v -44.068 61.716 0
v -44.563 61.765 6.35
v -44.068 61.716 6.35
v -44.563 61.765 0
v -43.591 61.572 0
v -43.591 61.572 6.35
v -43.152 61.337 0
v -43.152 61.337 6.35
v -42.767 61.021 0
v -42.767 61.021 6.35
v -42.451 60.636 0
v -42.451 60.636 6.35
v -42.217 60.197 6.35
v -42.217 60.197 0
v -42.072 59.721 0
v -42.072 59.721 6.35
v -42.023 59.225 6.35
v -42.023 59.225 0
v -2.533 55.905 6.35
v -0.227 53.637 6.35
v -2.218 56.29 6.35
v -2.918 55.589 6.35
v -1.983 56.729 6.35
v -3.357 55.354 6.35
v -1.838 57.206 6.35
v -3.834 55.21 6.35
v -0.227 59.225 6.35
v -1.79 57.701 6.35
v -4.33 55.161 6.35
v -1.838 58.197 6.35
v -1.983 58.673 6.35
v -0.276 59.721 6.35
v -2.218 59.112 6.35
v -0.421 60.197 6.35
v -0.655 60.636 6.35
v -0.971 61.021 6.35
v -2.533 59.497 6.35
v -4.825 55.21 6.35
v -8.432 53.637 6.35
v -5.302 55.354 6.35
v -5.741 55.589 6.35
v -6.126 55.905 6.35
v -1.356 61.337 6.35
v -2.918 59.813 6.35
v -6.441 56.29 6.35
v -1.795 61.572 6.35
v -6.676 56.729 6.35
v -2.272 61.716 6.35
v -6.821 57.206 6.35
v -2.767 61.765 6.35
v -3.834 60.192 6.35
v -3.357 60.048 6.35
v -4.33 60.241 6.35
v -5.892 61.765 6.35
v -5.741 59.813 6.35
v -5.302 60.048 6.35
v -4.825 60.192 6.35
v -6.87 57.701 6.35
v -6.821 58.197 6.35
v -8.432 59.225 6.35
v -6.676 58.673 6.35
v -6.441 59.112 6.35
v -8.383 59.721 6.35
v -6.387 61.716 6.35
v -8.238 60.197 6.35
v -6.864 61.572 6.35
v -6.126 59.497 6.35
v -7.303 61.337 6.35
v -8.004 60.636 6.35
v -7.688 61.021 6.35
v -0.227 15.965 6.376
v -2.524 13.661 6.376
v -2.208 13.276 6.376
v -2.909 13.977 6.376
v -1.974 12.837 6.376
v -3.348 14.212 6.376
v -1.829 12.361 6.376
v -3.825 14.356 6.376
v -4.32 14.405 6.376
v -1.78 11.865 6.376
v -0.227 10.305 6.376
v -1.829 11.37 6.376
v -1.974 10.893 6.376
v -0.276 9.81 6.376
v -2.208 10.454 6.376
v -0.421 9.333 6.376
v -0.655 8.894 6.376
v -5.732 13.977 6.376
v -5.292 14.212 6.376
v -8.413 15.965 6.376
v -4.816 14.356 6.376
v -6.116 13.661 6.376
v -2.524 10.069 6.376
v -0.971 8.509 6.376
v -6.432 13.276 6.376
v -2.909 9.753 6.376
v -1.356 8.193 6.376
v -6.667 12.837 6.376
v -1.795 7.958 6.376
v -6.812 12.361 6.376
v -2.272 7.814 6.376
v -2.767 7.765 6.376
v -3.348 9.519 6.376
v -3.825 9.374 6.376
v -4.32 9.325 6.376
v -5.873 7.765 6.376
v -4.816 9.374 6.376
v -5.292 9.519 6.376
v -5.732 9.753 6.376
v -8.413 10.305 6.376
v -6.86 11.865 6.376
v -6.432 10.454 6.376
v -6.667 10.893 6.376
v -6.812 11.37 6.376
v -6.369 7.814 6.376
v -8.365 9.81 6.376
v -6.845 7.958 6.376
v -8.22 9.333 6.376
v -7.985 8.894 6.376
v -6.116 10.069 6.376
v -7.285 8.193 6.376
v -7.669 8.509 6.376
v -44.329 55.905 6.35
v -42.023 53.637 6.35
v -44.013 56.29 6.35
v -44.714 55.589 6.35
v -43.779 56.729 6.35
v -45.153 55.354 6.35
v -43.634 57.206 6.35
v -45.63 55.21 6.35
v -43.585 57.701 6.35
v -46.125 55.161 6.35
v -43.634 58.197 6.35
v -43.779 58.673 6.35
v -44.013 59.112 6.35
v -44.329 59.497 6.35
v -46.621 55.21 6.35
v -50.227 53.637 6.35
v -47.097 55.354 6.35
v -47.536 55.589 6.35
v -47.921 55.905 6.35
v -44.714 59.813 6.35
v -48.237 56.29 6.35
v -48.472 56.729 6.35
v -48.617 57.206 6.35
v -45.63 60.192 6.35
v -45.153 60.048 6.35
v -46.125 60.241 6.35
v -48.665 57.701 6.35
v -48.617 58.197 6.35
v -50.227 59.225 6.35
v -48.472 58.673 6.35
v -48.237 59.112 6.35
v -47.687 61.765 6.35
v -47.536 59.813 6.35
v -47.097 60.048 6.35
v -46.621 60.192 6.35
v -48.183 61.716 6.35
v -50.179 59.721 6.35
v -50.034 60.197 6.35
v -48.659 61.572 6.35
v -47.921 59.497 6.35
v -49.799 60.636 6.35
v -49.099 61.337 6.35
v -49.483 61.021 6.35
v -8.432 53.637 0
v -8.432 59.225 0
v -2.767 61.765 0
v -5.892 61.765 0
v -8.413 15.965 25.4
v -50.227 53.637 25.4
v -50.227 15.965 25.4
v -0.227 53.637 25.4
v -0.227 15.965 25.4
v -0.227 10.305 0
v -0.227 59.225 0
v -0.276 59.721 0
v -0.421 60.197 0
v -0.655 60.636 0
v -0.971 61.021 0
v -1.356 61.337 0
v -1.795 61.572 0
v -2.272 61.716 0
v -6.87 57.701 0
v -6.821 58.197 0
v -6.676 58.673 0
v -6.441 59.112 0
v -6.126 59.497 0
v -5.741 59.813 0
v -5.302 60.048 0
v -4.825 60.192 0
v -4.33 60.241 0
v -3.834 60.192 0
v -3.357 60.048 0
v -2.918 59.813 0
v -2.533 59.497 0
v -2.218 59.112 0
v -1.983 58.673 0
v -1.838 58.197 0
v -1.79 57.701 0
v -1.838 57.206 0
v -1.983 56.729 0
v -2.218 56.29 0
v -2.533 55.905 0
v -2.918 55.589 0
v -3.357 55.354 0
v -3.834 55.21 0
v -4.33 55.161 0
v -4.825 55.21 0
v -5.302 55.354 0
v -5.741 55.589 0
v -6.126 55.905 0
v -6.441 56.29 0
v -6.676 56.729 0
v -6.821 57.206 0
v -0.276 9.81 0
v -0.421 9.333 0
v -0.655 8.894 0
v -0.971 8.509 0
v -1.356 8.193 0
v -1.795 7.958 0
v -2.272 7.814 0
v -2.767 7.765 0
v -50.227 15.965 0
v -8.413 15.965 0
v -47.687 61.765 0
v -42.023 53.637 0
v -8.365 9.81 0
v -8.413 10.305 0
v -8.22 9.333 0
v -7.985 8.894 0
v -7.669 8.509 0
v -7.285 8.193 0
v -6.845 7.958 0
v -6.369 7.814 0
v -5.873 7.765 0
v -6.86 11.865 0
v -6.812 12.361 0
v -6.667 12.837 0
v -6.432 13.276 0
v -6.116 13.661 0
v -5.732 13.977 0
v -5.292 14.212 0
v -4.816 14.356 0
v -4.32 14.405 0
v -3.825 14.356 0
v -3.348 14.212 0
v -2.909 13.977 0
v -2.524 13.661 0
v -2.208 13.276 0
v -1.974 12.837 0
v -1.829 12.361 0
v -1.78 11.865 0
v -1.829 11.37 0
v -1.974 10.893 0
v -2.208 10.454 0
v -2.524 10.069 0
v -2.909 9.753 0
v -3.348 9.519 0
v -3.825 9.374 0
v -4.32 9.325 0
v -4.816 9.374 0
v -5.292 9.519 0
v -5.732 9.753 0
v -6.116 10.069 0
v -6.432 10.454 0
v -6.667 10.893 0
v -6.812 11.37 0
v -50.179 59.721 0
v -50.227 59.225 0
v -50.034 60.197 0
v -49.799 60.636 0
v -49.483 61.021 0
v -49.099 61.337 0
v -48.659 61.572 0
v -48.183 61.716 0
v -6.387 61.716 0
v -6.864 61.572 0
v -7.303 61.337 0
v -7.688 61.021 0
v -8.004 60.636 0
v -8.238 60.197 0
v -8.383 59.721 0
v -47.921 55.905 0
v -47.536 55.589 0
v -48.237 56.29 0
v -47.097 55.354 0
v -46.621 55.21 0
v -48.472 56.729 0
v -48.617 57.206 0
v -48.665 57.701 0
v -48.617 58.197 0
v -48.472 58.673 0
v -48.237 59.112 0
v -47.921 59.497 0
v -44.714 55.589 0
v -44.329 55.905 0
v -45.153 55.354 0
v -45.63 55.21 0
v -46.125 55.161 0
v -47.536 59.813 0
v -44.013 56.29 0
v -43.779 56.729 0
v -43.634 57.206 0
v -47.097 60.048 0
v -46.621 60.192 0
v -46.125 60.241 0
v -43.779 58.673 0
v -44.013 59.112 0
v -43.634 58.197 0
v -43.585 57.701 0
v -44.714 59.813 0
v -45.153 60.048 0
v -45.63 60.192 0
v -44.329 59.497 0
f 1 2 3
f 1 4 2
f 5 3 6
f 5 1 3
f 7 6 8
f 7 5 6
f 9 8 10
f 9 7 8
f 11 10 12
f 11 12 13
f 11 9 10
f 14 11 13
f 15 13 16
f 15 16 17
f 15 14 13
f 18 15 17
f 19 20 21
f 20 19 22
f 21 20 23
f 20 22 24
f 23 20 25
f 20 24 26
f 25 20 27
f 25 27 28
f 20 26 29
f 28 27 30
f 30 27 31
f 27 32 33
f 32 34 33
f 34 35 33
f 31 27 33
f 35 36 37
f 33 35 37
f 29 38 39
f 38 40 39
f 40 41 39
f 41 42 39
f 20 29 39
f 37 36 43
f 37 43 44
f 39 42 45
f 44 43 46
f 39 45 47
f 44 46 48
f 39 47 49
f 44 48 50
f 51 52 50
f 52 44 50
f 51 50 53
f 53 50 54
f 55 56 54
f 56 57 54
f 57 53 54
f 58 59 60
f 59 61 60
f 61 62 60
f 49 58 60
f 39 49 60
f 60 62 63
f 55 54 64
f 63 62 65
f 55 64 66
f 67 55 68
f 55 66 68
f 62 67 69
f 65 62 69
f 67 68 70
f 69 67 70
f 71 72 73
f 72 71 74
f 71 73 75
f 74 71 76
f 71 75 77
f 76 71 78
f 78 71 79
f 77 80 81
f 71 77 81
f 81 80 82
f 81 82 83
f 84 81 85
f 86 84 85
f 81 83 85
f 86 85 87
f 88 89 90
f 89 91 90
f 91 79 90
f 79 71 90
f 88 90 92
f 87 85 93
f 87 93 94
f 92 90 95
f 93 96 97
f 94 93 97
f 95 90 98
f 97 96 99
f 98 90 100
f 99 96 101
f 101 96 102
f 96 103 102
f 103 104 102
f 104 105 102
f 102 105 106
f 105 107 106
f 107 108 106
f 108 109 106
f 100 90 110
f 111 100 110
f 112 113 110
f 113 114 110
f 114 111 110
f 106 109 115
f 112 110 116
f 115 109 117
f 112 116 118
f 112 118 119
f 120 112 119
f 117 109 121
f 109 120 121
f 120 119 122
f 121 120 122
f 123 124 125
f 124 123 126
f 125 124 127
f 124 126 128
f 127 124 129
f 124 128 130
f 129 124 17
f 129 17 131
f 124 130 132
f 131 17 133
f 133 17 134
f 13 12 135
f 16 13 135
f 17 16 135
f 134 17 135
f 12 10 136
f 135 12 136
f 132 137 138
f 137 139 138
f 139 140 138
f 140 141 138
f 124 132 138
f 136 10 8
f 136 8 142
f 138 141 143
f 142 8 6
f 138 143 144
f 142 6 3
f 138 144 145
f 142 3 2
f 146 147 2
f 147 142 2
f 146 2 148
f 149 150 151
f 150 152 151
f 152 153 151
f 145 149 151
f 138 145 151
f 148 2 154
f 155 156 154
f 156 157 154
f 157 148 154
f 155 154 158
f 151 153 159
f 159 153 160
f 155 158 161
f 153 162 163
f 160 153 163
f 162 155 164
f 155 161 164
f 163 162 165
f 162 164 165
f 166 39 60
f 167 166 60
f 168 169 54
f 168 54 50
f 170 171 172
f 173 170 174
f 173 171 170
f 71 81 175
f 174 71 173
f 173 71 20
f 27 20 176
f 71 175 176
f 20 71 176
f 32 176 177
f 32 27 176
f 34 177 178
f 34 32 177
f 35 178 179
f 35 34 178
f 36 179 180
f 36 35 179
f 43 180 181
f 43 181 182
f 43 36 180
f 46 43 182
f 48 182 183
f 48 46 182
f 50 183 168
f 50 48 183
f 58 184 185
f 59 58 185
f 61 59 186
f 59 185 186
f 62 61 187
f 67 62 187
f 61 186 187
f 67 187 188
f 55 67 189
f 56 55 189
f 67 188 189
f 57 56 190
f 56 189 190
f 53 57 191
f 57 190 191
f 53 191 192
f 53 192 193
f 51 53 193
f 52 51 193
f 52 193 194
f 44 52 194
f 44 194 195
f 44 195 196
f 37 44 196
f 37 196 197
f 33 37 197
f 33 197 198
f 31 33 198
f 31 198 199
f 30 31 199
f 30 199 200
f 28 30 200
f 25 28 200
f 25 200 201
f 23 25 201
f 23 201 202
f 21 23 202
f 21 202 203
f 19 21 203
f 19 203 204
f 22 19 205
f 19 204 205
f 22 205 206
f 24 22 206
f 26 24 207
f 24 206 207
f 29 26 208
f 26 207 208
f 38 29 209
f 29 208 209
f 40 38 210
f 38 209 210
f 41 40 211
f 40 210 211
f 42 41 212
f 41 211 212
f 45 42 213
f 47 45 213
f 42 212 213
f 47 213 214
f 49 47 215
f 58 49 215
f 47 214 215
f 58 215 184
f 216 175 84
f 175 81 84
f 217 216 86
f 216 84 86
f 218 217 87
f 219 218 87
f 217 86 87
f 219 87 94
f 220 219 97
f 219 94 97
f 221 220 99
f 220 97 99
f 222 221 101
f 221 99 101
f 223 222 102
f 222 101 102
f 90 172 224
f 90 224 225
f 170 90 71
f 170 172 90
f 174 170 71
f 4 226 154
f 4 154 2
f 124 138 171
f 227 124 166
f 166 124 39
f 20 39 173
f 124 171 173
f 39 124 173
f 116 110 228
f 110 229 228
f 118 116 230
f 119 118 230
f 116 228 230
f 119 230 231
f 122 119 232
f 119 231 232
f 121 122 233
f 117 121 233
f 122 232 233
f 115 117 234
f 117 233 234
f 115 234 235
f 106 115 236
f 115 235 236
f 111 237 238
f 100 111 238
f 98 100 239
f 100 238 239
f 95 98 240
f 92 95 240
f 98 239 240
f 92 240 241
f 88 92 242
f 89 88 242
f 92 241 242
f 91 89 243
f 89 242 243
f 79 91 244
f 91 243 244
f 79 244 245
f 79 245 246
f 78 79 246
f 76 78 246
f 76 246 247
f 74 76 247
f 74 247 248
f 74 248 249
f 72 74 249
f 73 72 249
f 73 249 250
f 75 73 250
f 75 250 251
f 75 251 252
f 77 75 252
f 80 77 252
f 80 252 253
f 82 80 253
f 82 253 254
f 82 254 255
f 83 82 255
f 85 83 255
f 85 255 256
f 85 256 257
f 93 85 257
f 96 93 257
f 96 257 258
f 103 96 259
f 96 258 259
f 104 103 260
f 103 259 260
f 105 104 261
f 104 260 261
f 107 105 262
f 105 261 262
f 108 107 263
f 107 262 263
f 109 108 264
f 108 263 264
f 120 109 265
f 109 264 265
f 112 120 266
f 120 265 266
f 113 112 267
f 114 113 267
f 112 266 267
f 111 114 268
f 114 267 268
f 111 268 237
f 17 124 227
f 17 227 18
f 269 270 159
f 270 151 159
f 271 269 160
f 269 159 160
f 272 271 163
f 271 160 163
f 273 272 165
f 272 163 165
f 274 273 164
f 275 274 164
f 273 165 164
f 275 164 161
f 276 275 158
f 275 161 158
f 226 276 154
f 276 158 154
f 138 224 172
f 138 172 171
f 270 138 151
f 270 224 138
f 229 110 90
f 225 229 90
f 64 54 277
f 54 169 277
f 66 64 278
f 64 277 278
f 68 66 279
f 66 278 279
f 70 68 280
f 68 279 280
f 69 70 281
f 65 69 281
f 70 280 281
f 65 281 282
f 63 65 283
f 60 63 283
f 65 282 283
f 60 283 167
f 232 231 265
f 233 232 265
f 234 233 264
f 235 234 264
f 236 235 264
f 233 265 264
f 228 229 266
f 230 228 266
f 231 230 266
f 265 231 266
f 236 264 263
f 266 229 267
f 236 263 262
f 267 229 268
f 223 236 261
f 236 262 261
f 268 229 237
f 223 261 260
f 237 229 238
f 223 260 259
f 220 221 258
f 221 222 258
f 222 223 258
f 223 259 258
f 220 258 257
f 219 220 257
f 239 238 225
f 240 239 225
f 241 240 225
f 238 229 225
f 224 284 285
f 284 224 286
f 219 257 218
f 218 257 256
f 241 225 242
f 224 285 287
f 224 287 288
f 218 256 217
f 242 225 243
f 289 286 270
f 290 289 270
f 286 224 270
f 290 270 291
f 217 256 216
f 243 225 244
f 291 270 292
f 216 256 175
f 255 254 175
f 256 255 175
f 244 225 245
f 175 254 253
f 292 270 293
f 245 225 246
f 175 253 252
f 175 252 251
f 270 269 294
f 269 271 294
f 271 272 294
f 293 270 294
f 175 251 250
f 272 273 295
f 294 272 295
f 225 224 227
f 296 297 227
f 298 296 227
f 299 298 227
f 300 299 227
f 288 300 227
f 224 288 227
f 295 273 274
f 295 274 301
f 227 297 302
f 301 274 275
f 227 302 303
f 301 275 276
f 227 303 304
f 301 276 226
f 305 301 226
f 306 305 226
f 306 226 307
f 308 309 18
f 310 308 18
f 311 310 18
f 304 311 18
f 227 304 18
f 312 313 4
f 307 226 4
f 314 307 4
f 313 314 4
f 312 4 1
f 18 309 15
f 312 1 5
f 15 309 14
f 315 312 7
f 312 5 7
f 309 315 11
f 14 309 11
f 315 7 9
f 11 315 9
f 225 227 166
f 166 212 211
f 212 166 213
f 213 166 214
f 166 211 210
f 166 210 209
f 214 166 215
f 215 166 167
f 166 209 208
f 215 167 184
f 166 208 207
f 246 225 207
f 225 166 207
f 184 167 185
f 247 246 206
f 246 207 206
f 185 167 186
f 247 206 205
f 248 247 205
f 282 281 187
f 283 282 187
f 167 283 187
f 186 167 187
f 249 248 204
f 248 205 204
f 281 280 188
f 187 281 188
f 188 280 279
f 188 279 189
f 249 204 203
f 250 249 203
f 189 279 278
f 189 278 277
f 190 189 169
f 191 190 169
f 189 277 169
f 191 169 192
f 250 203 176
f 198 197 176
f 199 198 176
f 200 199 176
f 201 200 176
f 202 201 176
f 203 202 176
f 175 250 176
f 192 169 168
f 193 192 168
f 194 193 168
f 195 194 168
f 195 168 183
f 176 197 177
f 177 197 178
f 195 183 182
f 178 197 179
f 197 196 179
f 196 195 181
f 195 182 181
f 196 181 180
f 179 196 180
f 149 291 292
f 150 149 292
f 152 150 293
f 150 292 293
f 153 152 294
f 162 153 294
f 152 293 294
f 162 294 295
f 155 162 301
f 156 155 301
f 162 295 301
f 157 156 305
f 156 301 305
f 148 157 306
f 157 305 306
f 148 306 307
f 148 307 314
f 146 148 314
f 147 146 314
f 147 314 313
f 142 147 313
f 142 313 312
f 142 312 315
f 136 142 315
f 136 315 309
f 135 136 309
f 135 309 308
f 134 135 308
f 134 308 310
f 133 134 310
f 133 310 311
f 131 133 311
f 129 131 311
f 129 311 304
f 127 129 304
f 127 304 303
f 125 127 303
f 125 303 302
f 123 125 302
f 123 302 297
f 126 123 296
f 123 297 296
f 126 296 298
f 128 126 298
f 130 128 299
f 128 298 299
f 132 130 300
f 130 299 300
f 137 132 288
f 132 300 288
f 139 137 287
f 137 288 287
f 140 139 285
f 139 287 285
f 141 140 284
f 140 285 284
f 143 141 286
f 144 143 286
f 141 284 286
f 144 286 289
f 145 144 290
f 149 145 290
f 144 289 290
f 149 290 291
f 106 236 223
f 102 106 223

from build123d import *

# Parameters (mm, degrees)
F0_W         = 50
F0_H         = 54
F1_DEPTH     = 25.4
F2_W         = 41.8139733374
F2_H         = 8.200337179
F3_DEPTH     = 50.8
F4_W         = 8.200337179
F4_H         = 19.0244916171
F5_DEPTH     = 25.4
F7_D         = 5.08
F8_R         = 2.54
F9_W         = 50
F9_H         = 19.05
F10_DEPTH    = 8.128
F11_W        = 33.5916
F11_H        = 8.128
F12_DEPTH    = 25.4
F15_D        = 5.08
F15_ON_F13_D = 5.08
F16_R        = 2.54


with BuildPart() as f1:
    # F0 (on Top) → F1 (new body)
    with BuildSketch(Plane.XY):
        with Locations((-25.227407366, 34.7650984749)):
            Rectangle(F0_W, F0_H)
    extrude(amount=F1_DEPTH)

    # F2 (on face) → F3 (cut)
    with BuildSketch(Plane.XY.offset(25.4)):
        with Locations((-29.3204206973, 11.8652670644)):
            Rectangle(F2_W, F2_H)
    extrude(amount=-F3_DEPTH, mode=Mode.SUBTRACT)

    # F4 (on face) → F5 (cut)
    with BuildSketch(Plane(origin=(-8.4134340286, 0, 0), x_dir=(0, -1, 0), z_dir=(-1, 0, 0))):
        with Locations((-11.8652670644, 15.8877541915)):
            Rectangle(F4_W, F4_H)
    extrude(amount=-F5_DEPTH, mode=Mode.SUBTRACT)

    # F7 (through all)
    with Locations(Plane.XY.offset(6.3755083829)):
        with Locations((-4.3204206973, 11.8652670644)):
            Hole(F7_D / 2)

    # F8
    f8_edges = [f1.edges().sort_by_distance(p)[0] for p in [
        (-8.413434, 7.765098, 3.187754),
        (-0.227407, 7.765098, 3.187754),
    ]]
    fillet(f8_edges, radius=F8_R)

    # F9 (on face) → F10 (cut)
    with BuildSketch(Plane(origin=(0, 61.7650984749, 0), x_dir=(-1, 0, 0), z_dir=(0, 1, 0))):
        with Locations((25.227407366, 15.875)):
            Rectangle(F9_W, F9_H)
    extrude(amount=-F10_DEPTH, mode=Mode.SUBTRACT)

    # F11 (on face) → F12 (cut)
    with BuildSketch(Plane.XY.offset(6.35)):
        with Locations((-25.227407366, 57.7010984749)):
            Rectangle(F11_W, F11_H)
    extrude(amount=-F12_DEPTH, mode=Mode.SUBTRACT)

    # F15 (through all)
    with Locations(Plane.XY.offset(6.35)):
        with Locations((-4.329507366, 57.7010984749)):
            Hole(F15_D / 2)

    # F15 on F13 (through all)
    with Locations(Plane.XY.offset(6.35)):
        with Locations((-46.125307366, 57.7010984749)):
            Hole(F15_ON_F13_D / 2)

    # F16
    f16_edges = [f1.edges().sort_by_distance(p)[0] for p in [
        (-50.227407, 61.765098, 3.175),
        (-42.023207, 61.765098, 3.175),
        (-8.431607, 61.765098, 3.175),
        (-0.227407, 61.765098, 3.175),
    ]]
    fillet(f16_edges, radius=F16_R)


solid = f1.part
